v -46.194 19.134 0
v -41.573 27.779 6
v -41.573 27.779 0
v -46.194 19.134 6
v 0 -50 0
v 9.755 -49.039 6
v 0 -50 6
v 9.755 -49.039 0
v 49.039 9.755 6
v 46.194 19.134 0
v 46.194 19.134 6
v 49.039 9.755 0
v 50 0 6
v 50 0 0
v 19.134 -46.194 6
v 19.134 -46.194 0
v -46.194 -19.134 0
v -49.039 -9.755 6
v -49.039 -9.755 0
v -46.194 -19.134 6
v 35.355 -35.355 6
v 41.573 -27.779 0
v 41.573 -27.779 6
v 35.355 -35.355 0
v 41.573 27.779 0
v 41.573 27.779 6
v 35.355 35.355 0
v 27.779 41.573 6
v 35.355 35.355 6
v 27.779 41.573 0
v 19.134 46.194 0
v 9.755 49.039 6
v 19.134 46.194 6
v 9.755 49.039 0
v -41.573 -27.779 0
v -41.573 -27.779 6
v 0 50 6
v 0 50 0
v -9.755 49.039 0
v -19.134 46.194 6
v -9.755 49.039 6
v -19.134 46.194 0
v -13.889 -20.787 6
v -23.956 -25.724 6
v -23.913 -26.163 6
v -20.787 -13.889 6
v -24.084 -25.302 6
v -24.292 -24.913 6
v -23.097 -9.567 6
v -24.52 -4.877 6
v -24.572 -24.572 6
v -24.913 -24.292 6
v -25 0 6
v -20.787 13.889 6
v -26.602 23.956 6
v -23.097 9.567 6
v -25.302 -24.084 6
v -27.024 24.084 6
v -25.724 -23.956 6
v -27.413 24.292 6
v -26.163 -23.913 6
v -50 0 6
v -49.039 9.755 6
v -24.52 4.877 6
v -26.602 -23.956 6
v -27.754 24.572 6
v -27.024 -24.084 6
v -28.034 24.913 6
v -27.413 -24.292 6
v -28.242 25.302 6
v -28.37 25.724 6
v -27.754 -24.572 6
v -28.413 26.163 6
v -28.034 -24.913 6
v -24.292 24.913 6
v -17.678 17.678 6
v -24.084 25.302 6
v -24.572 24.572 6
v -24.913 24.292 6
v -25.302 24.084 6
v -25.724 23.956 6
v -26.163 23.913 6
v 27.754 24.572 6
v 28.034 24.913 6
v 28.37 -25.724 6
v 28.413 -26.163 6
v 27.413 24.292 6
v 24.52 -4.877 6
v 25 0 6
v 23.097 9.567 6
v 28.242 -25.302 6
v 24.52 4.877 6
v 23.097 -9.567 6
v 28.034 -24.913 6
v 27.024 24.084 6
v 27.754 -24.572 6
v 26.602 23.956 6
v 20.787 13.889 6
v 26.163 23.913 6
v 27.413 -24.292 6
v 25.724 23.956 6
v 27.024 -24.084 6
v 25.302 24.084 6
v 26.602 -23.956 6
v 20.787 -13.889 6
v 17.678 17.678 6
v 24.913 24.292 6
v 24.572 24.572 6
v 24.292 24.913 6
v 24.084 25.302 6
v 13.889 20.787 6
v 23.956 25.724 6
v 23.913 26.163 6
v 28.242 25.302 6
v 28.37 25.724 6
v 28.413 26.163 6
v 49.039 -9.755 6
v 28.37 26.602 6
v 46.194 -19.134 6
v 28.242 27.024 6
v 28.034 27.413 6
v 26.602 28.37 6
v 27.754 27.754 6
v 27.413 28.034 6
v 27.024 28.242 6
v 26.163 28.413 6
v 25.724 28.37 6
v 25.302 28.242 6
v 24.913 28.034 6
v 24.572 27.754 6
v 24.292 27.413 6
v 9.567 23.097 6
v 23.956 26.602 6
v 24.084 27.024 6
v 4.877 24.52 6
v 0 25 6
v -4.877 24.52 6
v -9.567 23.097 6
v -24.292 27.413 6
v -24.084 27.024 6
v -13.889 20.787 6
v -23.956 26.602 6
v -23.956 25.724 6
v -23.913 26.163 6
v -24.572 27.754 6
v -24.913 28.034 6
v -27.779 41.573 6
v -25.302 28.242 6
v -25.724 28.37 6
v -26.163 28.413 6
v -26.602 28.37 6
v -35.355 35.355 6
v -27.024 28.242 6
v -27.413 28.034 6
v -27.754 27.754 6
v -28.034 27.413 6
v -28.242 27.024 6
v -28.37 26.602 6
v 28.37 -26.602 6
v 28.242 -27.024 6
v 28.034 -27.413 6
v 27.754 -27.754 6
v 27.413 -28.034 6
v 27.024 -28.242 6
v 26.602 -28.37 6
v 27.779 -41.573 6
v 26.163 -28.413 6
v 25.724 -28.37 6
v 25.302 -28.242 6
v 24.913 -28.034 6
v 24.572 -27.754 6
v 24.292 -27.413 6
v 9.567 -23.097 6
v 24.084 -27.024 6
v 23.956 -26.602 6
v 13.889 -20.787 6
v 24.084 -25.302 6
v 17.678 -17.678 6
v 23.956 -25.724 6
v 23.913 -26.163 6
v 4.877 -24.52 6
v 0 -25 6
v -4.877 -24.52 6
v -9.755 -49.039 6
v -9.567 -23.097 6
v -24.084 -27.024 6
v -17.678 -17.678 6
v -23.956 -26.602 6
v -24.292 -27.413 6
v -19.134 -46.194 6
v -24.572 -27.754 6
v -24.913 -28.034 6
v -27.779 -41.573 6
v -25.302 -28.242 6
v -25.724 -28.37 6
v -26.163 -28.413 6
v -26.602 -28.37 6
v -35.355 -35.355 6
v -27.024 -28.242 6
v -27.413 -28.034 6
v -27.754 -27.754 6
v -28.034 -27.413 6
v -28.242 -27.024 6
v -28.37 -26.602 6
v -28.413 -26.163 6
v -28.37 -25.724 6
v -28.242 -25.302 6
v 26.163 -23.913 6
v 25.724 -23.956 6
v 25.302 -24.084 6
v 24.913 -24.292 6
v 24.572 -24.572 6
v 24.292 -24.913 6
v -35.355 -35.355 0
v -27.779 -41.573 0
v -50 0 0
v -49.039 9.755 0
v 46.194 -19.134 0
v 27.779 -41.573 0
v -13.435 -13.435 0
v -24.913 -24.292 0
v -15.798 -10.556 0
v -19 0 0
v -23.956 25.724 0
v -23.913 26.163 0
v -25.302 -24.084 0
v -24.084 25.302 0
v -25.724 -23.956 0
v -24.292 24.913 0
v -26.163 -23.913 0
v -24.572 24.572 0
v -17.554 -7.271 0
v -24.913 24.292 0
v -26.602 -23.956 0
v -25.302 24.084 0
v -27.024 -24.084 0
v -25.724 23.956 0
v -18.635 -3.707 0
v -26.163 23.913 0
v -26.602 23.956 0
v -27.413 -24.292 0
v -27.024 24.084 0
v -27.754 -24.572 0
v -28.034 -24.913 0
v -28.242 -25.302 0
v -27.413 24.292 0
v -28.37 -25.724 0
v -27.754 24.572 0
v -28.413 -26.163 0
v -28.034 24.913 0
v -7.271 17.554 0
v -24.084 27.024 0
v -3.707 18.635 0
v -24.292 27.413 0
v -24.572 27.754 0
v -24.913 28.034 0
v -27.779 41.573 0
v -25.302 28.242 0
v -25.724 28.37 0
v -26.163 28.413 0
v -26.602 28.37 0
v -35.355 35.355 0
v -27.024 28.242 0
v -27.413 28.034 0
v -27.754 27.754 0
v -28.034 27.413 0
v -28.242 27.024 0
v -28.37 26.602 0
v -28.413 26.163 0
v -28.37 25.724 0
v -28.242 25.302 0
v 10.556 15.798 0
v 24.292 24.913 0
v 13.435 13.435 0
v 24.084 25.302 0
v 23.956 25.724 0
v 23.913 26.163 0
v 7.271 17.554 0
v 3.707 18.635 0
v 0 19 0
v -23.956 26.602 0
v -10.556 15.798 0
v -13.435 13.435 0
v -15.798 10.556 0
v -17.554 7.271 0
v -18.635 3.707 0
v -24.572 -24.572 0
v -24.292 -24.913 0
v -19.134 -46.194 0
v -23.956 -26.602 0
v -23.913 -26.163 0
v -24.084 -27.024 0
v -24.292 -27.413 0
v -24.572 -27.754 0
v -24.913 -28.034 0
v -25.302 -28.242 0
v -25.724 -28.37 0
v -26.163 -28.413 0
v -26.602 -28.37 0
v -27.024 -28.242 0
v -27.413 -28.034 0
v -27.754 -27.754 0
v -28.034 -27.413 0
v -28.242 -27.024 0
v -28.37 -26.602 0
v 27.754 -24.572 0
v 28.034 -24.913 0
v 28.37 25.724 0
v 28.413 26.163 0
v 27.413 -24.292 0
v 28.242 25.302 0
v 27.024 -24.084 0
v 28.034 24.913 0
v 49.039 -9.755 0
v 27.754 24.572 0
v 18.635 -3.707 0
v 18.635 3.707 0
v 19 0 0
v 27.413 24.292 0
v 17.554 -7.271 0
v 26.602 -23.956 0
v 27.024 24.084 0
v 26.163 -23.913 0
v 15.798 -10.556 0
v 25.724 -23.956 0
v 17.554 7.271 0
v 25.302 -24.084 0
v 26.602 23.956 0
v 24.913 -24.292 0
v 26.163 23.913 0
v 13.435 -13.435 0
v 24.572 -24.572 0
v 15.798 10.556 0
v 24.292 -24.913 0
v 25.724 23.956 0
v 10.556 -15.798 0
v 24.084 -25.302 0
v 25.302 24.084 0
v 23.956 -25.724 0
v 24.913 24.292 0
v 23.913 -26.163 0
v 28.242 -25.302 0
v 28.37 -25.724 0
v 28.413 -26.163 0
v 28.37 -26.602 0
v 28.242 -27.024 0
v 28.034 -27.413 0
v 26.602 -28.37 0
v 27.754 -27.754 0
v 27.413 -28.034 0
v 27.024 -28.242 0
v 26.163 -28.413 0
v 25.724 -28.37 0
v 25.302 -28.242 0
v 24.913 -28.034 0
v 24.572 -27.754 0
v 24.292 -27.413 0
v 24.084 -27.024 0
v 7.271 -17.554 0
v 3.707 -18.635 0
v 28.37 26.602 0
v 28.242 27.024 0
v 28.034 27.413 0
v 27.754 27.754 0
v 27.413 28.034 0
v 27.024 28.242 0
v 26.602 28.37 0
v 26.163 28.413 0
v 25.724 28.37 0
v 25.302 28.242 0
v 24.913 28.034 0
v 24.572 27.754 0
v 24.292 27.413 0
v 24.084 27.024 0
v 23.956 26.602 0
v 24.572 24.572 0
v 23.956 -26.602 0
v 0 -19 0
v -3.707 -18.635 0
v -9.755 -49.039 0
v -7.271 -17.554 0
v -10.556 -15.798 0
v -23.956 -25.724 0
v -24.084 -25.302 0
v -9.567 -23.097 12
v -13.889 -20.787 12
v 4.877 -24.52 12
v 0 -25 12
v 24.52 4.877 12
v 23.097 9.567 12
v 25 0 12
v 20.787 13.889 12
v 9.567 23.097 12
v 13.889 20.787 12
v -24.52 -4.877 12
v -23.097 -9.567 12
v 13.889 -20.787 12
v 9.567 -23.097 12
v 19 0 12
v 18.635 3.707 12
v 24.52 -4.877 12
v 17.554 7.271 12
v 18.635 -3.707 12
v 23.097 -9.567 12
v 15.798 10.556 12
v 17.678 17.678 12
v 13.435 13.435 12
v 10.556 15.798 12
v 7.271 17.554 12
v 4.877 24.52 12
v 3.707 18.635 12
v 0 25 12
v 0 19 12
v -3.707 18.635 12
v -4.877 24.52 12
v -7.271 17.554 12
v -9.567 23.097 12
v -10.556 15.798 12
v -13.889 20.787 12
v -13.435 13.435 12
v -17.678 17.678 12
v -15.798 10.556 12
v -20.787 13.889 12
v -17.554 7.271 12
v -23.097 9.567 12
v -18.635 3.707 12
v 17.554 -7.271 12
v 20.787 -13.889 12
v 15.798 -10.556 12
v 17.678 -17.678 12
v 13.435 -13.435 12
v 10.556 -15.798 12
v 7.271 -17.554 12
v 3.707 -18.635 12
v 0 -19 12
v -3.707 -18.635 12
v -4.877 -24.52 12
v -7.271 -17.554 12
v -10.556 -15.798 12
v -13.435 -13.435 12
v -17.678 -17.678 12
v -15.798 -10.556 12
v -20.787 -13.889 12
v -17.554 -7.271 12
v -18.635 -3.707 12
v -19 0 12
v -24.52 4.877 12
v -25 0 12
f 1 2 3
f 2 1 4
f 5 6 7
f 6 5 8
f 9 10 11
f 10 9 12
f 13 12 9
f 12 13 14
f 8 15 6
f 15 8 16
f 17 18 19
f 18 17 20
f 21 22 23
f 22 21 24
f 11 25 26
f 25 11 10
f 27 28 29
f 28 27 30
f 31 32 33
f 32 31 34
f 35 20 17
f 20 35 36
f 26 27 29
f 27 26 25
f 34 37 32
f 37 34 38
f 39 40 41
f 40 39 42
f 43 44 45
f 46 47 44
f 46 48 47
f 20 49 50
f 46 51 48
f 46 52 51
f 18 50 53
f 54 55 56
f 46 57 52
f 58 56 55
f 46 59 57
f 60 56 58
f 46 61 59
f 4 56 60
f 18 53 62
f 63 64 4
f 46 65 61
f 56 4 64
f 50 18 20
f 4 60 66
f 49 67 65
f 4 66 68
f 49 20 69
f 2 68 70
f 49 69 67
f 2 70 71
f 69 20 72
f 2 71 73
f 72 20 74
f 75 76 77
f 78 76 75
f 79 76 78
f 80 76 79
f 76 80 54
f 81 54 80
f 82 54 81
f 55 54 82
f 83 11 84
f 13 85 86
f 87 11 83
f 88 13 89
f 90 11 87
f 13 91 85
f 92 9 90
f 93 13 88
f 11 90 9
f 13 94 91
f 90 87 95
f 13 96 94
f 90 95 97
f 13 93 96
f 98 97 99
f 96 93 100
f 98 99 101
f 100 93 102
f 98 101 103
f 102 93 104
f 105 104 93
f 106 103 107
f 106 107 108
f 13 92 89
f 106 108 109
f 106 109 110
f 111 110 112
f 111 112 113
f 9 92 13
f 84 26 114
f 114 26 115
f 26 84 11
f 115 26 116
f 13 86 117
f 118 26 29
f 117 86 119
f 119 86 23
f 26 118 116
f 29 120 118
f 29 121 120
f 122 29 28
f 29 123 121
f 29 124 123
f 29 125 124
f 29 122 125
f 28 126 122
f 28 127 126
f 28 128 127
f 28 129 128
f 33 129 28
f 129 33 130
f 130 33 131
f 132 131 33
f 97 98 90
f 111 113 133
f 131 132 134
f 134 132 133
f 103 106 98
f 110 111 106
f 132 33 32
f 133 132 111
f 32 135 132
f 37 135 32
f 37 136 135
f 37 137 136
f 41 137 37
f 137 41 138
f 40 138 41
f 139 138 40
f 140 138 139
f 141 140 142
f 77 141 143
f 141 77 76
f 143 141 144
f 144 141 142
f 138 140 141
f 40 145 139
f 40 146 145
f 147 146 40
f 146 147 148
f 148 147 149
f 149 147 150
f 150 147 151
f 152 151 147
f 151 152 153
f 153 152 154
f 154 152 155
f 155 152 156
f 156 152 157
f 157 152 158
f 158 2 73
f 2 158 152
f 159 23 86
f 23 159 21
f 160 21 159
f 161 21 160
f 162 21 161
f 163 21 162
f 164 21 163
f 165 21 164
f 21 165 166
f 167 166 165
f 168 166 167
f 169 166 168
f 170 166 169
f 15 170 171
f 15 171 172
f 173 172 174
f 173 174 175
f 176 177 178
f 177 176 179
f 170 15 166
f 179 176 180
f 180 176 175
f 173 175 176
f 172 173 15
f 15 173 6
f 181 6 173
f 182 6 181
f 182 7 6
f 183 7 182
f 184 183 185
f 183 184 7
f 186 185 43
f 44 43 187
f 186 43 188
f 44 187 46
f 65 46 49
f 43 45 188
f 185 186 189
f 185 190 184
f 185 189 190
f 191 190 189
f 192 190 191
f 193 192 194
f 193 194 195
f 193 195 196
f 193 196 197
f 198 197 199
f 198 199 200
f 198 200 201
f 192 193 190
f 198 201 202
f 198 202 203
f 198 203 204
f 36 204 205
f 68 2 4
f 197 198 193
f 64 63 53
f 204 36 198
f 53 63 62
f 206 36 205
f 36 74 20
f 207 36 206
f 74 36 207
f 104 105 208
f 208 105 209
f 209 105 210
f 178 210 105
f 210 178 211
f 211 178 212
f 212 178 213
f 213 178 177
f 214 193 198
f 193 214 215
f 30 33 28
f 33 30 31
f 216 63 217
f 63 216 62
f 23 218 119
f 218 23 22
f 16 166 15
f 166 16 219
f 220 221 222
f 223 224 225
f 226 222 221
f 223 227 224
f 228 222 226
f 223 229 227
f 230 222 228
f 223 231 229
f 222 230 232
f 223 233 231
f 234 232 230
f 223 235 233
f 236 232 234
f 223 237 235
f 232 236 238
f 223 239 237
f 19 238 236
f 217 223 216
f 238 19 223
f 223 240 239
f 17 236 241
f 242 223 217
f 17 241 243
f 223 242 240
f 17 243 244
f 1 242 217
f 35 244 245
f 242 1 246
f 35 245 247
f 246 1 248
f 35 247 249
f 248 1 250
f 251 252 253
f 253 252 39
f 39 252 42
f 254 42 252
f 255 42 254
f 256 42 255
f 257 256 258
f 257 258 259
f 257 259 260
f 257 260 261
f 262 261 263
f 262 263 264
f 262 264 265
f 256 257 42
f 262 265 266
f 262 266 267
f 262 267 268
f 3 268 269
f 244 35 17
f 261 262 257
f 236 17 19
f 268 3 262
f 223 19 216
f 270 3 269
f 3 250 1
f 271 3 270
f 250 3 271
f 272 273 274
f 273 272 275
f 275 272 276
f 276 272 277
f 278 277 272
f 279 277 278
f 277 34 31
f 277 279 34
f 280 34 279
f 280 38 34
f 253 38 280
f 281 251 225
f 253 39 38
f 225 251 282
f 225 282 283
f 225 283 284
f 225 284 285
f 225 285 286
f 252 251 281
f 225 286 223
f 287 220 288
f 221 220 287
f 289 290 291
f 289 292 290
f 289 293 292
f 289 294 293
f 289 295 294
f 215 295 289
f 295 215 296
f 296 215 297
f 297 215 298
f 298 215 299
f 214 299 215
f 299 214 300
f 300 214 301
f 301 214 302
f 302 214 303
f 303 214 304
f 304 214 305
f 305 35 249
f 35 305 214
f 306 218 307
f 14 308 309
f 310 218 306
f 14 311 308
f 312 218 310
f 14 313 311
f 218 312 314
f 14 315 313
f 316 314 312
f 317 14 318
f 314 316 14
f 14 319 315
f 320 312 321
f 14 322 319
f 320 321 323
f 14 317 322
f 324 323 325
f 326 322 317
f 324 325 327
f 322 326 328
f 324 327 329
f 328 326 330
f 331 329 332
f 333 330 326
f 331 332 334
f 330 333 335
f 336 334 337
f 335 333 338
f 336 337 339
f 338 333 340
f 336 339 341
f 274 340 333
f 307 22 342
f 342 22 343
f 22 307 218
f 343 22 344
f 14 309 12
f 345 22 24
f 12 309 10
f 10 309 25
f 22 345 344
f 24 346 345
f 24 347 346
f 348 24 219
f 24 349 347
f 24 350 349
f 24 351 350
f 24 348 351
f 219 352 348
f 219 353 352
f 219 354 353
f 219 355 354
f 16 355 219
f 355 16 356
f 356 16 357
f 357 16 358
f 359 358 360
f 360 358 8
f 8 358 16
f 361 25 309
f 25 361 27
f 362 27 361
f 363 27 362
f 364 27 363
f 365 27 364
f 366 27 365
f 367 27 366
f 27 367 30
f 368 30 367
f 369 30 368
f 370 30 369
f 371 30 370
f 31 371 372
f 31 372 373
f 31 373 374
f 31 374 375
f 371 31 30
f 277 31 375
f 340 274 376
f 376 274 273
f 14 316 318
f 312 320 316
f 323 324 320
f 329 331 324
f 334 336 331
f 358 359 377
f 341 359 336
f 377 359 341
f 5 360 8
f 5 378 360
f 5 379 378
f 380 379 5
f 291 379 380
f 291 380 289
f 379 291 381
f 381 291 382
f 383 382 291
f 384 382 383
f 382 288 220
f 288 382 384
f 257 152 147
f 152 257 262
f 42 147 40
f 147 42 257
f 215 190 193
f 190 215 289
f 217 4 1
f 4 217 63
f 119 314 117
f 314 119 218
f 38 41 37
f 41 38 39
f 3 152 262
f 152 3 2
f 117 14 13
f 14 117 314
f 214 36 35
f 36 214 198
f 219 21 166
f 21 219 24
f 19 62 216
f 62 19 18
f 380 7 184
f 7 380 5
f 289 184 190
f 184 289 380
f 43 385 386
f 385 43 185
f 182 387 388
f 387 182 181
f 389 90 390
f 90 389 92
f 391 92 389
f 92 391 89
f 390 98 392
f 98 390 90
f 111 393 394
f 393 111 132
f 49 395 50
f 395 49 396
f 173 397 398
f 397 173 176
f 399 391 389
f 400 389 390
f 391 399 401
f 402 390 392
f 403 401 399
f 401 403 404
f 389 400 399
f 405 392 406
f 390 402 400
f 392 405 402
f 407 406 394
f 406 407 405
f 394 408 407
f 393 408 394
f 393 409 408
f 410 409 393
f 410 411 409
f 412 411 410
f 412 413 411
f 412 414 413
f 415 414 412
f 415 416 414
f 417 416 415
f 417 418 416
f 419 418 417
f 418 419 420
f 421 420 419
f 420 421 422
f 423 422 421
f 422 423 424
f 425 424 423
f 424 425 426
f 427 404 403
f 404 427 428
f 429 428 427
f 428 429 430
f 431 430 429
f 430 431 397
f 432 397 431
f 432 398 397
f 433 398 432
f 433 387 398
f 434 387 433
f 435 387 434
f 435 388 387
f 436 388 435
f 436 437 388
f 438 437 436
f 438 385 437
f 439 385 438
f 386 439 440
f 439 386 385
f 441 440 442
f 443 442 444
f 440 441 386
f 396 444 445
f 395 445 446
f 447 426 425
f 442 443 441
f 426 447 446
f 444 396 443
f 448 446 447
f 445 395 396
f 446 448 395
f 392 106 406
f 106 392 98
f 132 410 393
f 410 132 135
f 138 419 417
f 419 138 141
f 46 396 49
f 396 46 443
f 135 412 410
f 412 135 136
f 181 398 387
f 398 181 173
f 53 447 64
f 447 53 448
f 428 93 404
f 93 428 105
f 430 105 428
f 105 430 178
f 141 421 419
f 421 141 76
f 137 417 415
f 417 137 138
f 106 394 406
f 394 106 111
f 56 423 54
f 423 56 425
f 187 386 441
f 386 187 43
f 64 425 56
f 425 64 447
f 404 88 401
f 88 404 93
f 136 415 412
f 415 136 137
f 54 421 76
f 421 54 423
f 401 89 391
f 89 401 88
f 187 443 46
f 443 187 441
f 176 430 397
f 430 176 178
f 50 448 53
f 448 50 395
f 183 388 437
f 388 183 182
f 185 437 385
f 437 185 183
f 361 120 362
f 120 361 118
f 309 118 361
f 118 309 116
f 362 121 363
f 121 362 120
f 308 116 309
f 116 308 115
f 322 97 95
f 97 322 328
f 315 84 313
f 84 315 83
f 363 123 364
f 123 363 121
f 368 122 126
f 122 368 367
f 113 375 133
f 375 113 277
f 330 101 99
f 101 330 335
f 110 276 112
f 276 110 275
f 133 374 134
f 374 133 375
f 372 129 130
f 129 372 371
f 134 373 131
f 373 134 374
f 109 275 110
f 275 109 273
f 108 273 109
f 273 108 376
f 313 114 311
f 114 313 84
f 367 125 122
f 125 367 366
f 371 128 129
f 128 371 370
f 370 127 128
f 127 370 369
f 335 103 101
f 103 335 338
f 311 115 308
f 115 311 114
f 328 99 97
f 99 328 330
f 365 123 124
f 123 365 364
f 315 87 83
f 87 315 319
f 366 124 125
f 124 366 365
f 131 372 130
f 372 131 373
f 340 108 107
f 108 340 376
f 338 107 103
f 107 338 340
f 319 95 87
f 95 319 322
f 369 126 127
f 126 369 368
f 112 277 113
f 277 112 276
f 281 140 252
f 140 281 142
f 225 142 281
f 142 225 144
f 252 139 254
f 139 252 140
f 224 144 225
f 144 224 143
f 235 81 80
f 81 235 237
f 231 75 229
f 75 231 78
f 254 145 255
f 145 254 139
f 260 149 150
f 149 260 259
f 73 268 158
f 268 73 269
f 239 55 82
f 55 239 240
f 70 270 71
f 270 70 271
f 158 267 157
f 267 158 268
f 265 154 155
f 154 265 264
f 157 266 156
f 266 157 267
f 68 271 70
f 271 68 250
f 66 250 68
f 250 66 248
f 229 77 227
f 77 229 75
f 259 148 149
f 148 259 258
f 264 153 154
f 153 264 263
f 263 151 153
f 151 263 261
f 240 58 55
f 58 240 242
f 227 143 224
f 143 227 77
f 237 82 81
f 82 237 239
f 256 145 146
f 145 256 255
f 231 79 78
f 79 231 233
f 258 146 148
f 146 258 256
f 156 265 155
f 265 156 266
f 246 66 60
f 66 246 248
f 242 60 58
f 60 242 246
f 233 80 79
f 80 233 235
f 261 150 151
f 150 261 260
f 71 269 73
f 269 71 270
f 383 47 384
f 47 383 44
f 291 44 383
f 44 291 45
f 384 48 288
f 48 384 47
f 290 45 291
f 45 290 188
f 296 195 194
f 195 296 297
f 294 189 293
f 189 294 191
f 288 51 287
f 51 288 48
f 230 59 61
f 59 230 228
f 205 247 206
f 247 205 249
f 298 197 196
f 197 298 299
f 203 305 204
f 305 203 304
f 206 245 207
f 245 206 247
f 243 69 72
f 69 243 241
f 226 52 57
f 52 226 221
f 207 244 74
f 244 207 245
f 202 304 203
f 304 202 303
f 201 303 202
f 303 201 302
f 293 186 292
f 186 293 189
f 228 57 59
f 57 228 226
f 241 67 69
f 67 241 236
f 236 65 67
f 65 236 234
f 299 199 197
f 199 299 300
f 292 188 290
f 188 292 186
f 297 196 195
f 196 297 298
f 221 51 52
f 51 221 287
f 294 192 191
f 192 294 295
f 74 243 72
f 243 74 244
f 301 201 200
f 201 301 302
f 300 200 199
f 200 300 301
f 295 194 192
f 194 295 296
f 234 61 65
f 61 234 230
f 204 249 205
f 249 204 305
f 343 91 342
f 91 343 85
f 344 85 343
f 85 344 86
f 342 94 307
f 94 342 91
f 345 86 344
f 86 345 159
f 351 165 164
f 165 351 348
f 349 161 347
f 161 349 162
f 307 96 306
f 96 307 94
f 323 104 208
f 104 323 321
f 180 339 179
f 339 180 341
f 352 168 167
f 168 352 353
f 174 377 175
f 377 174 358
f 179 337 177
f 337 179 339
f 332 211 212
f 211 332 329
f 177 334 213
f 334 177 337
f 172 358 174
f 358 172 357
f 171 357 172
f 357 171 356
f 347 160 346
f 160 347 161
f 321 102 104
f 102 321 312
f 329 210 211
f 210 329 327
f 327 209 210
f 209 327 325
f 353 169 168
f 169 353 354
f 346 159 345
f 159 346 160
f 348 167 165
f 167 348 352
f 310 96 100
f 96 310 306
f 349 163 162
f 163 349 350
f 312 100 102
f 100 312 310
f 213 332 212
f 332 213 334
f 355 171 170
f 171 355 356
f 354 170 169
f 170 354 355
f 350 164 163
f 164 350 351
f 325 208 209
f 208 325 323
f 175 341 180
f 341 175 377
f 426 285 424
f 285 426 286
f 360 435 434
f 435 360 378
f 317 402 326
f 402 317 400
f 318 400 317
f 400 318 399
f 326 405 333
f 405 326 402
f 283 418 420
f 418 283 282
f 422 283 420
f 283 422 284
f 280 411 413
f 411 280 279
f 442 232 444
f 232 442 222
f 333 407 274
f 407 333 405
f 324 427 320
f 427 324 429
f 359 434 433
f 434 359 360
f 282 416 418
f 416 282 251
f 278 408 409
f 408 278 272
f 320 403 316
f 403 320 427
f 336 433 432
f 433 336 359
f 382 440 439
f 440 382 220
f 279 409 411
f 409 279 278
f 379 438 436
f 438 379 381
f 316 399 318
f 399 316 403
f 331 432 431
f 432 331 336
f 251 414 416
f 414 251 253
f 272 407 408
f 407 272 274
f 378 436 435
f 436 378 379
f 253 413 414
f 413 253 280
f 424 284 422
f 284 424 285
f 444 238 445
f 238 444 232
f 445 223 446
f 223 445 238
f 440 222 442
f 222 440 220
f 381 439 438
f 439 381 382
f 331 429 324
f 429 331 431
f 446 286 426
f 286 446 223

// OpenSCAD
$fn = 32;

// ----------------------------------------------------------------------
// Flange Ø100 x 6
// 4 holes on a Ø74 bolt circle, bolted joints
// ----------------------------------------------------------------------

// --- parameters (mm) ---
flange_d = 100;  // outside diameter of the flange
thickness = 6;   // flange thickness
holes = 4;       // number of bolt holes
pcd = 74;        // bolt circle diameter
start_deg = 45;  // angle of the first hole, from +X
hole_d = 4.5;    // bolt hole diameter
bore_d = 38;     // central through bore
hub_d = 50;      // hub outside diameter
hub_h = 6;       // hub height above the flange face (0 = no hub)

// --- derived feature positions (mm) ---
height = thickness + hub_h;  // = 12   overall height of the part
pcd_r = pcd / 2;             // = 37   bolt circle radius
hole_step = 360 / holes;     // = 90   angular pitch
feature_centers = [
  [pcd_r * cos(start_deg + 0 * hole_step), pcd_r * sin(start_deg + 0 * hole_step)],
  [pcd_r * cos(start_deg + 1 * hole_step), pcd_r * sin(start_deg + 1 * hole_step)],
  [pcd_r * cos(start_deg + 2 * hole_step), pcd_r * sin(start_deg + 2 * hole_step)],
  [pcd_r * cos(start_deg + 3 * hole_step), pcd_r * sin(start_deg + 3 * hole_step)]
];   // bolt hole centres on the pitch circle

// flange disc, every hole and the bore cut straight through
difference() {
  union() {
    cylinder(d = flange_d, h = thickness);
    cylinder(d = hub_d, h = height);  // hub, overlapped into the flange
  }
  translate([0, 0, -1]) cylinder(d = bore_d, h = height + 2);  // bore, through
  for (centre = feature_centers)
    translate([centre[0], centre[1], -1]) cylinder(d = hole_d, h = thickness + 2);
}
